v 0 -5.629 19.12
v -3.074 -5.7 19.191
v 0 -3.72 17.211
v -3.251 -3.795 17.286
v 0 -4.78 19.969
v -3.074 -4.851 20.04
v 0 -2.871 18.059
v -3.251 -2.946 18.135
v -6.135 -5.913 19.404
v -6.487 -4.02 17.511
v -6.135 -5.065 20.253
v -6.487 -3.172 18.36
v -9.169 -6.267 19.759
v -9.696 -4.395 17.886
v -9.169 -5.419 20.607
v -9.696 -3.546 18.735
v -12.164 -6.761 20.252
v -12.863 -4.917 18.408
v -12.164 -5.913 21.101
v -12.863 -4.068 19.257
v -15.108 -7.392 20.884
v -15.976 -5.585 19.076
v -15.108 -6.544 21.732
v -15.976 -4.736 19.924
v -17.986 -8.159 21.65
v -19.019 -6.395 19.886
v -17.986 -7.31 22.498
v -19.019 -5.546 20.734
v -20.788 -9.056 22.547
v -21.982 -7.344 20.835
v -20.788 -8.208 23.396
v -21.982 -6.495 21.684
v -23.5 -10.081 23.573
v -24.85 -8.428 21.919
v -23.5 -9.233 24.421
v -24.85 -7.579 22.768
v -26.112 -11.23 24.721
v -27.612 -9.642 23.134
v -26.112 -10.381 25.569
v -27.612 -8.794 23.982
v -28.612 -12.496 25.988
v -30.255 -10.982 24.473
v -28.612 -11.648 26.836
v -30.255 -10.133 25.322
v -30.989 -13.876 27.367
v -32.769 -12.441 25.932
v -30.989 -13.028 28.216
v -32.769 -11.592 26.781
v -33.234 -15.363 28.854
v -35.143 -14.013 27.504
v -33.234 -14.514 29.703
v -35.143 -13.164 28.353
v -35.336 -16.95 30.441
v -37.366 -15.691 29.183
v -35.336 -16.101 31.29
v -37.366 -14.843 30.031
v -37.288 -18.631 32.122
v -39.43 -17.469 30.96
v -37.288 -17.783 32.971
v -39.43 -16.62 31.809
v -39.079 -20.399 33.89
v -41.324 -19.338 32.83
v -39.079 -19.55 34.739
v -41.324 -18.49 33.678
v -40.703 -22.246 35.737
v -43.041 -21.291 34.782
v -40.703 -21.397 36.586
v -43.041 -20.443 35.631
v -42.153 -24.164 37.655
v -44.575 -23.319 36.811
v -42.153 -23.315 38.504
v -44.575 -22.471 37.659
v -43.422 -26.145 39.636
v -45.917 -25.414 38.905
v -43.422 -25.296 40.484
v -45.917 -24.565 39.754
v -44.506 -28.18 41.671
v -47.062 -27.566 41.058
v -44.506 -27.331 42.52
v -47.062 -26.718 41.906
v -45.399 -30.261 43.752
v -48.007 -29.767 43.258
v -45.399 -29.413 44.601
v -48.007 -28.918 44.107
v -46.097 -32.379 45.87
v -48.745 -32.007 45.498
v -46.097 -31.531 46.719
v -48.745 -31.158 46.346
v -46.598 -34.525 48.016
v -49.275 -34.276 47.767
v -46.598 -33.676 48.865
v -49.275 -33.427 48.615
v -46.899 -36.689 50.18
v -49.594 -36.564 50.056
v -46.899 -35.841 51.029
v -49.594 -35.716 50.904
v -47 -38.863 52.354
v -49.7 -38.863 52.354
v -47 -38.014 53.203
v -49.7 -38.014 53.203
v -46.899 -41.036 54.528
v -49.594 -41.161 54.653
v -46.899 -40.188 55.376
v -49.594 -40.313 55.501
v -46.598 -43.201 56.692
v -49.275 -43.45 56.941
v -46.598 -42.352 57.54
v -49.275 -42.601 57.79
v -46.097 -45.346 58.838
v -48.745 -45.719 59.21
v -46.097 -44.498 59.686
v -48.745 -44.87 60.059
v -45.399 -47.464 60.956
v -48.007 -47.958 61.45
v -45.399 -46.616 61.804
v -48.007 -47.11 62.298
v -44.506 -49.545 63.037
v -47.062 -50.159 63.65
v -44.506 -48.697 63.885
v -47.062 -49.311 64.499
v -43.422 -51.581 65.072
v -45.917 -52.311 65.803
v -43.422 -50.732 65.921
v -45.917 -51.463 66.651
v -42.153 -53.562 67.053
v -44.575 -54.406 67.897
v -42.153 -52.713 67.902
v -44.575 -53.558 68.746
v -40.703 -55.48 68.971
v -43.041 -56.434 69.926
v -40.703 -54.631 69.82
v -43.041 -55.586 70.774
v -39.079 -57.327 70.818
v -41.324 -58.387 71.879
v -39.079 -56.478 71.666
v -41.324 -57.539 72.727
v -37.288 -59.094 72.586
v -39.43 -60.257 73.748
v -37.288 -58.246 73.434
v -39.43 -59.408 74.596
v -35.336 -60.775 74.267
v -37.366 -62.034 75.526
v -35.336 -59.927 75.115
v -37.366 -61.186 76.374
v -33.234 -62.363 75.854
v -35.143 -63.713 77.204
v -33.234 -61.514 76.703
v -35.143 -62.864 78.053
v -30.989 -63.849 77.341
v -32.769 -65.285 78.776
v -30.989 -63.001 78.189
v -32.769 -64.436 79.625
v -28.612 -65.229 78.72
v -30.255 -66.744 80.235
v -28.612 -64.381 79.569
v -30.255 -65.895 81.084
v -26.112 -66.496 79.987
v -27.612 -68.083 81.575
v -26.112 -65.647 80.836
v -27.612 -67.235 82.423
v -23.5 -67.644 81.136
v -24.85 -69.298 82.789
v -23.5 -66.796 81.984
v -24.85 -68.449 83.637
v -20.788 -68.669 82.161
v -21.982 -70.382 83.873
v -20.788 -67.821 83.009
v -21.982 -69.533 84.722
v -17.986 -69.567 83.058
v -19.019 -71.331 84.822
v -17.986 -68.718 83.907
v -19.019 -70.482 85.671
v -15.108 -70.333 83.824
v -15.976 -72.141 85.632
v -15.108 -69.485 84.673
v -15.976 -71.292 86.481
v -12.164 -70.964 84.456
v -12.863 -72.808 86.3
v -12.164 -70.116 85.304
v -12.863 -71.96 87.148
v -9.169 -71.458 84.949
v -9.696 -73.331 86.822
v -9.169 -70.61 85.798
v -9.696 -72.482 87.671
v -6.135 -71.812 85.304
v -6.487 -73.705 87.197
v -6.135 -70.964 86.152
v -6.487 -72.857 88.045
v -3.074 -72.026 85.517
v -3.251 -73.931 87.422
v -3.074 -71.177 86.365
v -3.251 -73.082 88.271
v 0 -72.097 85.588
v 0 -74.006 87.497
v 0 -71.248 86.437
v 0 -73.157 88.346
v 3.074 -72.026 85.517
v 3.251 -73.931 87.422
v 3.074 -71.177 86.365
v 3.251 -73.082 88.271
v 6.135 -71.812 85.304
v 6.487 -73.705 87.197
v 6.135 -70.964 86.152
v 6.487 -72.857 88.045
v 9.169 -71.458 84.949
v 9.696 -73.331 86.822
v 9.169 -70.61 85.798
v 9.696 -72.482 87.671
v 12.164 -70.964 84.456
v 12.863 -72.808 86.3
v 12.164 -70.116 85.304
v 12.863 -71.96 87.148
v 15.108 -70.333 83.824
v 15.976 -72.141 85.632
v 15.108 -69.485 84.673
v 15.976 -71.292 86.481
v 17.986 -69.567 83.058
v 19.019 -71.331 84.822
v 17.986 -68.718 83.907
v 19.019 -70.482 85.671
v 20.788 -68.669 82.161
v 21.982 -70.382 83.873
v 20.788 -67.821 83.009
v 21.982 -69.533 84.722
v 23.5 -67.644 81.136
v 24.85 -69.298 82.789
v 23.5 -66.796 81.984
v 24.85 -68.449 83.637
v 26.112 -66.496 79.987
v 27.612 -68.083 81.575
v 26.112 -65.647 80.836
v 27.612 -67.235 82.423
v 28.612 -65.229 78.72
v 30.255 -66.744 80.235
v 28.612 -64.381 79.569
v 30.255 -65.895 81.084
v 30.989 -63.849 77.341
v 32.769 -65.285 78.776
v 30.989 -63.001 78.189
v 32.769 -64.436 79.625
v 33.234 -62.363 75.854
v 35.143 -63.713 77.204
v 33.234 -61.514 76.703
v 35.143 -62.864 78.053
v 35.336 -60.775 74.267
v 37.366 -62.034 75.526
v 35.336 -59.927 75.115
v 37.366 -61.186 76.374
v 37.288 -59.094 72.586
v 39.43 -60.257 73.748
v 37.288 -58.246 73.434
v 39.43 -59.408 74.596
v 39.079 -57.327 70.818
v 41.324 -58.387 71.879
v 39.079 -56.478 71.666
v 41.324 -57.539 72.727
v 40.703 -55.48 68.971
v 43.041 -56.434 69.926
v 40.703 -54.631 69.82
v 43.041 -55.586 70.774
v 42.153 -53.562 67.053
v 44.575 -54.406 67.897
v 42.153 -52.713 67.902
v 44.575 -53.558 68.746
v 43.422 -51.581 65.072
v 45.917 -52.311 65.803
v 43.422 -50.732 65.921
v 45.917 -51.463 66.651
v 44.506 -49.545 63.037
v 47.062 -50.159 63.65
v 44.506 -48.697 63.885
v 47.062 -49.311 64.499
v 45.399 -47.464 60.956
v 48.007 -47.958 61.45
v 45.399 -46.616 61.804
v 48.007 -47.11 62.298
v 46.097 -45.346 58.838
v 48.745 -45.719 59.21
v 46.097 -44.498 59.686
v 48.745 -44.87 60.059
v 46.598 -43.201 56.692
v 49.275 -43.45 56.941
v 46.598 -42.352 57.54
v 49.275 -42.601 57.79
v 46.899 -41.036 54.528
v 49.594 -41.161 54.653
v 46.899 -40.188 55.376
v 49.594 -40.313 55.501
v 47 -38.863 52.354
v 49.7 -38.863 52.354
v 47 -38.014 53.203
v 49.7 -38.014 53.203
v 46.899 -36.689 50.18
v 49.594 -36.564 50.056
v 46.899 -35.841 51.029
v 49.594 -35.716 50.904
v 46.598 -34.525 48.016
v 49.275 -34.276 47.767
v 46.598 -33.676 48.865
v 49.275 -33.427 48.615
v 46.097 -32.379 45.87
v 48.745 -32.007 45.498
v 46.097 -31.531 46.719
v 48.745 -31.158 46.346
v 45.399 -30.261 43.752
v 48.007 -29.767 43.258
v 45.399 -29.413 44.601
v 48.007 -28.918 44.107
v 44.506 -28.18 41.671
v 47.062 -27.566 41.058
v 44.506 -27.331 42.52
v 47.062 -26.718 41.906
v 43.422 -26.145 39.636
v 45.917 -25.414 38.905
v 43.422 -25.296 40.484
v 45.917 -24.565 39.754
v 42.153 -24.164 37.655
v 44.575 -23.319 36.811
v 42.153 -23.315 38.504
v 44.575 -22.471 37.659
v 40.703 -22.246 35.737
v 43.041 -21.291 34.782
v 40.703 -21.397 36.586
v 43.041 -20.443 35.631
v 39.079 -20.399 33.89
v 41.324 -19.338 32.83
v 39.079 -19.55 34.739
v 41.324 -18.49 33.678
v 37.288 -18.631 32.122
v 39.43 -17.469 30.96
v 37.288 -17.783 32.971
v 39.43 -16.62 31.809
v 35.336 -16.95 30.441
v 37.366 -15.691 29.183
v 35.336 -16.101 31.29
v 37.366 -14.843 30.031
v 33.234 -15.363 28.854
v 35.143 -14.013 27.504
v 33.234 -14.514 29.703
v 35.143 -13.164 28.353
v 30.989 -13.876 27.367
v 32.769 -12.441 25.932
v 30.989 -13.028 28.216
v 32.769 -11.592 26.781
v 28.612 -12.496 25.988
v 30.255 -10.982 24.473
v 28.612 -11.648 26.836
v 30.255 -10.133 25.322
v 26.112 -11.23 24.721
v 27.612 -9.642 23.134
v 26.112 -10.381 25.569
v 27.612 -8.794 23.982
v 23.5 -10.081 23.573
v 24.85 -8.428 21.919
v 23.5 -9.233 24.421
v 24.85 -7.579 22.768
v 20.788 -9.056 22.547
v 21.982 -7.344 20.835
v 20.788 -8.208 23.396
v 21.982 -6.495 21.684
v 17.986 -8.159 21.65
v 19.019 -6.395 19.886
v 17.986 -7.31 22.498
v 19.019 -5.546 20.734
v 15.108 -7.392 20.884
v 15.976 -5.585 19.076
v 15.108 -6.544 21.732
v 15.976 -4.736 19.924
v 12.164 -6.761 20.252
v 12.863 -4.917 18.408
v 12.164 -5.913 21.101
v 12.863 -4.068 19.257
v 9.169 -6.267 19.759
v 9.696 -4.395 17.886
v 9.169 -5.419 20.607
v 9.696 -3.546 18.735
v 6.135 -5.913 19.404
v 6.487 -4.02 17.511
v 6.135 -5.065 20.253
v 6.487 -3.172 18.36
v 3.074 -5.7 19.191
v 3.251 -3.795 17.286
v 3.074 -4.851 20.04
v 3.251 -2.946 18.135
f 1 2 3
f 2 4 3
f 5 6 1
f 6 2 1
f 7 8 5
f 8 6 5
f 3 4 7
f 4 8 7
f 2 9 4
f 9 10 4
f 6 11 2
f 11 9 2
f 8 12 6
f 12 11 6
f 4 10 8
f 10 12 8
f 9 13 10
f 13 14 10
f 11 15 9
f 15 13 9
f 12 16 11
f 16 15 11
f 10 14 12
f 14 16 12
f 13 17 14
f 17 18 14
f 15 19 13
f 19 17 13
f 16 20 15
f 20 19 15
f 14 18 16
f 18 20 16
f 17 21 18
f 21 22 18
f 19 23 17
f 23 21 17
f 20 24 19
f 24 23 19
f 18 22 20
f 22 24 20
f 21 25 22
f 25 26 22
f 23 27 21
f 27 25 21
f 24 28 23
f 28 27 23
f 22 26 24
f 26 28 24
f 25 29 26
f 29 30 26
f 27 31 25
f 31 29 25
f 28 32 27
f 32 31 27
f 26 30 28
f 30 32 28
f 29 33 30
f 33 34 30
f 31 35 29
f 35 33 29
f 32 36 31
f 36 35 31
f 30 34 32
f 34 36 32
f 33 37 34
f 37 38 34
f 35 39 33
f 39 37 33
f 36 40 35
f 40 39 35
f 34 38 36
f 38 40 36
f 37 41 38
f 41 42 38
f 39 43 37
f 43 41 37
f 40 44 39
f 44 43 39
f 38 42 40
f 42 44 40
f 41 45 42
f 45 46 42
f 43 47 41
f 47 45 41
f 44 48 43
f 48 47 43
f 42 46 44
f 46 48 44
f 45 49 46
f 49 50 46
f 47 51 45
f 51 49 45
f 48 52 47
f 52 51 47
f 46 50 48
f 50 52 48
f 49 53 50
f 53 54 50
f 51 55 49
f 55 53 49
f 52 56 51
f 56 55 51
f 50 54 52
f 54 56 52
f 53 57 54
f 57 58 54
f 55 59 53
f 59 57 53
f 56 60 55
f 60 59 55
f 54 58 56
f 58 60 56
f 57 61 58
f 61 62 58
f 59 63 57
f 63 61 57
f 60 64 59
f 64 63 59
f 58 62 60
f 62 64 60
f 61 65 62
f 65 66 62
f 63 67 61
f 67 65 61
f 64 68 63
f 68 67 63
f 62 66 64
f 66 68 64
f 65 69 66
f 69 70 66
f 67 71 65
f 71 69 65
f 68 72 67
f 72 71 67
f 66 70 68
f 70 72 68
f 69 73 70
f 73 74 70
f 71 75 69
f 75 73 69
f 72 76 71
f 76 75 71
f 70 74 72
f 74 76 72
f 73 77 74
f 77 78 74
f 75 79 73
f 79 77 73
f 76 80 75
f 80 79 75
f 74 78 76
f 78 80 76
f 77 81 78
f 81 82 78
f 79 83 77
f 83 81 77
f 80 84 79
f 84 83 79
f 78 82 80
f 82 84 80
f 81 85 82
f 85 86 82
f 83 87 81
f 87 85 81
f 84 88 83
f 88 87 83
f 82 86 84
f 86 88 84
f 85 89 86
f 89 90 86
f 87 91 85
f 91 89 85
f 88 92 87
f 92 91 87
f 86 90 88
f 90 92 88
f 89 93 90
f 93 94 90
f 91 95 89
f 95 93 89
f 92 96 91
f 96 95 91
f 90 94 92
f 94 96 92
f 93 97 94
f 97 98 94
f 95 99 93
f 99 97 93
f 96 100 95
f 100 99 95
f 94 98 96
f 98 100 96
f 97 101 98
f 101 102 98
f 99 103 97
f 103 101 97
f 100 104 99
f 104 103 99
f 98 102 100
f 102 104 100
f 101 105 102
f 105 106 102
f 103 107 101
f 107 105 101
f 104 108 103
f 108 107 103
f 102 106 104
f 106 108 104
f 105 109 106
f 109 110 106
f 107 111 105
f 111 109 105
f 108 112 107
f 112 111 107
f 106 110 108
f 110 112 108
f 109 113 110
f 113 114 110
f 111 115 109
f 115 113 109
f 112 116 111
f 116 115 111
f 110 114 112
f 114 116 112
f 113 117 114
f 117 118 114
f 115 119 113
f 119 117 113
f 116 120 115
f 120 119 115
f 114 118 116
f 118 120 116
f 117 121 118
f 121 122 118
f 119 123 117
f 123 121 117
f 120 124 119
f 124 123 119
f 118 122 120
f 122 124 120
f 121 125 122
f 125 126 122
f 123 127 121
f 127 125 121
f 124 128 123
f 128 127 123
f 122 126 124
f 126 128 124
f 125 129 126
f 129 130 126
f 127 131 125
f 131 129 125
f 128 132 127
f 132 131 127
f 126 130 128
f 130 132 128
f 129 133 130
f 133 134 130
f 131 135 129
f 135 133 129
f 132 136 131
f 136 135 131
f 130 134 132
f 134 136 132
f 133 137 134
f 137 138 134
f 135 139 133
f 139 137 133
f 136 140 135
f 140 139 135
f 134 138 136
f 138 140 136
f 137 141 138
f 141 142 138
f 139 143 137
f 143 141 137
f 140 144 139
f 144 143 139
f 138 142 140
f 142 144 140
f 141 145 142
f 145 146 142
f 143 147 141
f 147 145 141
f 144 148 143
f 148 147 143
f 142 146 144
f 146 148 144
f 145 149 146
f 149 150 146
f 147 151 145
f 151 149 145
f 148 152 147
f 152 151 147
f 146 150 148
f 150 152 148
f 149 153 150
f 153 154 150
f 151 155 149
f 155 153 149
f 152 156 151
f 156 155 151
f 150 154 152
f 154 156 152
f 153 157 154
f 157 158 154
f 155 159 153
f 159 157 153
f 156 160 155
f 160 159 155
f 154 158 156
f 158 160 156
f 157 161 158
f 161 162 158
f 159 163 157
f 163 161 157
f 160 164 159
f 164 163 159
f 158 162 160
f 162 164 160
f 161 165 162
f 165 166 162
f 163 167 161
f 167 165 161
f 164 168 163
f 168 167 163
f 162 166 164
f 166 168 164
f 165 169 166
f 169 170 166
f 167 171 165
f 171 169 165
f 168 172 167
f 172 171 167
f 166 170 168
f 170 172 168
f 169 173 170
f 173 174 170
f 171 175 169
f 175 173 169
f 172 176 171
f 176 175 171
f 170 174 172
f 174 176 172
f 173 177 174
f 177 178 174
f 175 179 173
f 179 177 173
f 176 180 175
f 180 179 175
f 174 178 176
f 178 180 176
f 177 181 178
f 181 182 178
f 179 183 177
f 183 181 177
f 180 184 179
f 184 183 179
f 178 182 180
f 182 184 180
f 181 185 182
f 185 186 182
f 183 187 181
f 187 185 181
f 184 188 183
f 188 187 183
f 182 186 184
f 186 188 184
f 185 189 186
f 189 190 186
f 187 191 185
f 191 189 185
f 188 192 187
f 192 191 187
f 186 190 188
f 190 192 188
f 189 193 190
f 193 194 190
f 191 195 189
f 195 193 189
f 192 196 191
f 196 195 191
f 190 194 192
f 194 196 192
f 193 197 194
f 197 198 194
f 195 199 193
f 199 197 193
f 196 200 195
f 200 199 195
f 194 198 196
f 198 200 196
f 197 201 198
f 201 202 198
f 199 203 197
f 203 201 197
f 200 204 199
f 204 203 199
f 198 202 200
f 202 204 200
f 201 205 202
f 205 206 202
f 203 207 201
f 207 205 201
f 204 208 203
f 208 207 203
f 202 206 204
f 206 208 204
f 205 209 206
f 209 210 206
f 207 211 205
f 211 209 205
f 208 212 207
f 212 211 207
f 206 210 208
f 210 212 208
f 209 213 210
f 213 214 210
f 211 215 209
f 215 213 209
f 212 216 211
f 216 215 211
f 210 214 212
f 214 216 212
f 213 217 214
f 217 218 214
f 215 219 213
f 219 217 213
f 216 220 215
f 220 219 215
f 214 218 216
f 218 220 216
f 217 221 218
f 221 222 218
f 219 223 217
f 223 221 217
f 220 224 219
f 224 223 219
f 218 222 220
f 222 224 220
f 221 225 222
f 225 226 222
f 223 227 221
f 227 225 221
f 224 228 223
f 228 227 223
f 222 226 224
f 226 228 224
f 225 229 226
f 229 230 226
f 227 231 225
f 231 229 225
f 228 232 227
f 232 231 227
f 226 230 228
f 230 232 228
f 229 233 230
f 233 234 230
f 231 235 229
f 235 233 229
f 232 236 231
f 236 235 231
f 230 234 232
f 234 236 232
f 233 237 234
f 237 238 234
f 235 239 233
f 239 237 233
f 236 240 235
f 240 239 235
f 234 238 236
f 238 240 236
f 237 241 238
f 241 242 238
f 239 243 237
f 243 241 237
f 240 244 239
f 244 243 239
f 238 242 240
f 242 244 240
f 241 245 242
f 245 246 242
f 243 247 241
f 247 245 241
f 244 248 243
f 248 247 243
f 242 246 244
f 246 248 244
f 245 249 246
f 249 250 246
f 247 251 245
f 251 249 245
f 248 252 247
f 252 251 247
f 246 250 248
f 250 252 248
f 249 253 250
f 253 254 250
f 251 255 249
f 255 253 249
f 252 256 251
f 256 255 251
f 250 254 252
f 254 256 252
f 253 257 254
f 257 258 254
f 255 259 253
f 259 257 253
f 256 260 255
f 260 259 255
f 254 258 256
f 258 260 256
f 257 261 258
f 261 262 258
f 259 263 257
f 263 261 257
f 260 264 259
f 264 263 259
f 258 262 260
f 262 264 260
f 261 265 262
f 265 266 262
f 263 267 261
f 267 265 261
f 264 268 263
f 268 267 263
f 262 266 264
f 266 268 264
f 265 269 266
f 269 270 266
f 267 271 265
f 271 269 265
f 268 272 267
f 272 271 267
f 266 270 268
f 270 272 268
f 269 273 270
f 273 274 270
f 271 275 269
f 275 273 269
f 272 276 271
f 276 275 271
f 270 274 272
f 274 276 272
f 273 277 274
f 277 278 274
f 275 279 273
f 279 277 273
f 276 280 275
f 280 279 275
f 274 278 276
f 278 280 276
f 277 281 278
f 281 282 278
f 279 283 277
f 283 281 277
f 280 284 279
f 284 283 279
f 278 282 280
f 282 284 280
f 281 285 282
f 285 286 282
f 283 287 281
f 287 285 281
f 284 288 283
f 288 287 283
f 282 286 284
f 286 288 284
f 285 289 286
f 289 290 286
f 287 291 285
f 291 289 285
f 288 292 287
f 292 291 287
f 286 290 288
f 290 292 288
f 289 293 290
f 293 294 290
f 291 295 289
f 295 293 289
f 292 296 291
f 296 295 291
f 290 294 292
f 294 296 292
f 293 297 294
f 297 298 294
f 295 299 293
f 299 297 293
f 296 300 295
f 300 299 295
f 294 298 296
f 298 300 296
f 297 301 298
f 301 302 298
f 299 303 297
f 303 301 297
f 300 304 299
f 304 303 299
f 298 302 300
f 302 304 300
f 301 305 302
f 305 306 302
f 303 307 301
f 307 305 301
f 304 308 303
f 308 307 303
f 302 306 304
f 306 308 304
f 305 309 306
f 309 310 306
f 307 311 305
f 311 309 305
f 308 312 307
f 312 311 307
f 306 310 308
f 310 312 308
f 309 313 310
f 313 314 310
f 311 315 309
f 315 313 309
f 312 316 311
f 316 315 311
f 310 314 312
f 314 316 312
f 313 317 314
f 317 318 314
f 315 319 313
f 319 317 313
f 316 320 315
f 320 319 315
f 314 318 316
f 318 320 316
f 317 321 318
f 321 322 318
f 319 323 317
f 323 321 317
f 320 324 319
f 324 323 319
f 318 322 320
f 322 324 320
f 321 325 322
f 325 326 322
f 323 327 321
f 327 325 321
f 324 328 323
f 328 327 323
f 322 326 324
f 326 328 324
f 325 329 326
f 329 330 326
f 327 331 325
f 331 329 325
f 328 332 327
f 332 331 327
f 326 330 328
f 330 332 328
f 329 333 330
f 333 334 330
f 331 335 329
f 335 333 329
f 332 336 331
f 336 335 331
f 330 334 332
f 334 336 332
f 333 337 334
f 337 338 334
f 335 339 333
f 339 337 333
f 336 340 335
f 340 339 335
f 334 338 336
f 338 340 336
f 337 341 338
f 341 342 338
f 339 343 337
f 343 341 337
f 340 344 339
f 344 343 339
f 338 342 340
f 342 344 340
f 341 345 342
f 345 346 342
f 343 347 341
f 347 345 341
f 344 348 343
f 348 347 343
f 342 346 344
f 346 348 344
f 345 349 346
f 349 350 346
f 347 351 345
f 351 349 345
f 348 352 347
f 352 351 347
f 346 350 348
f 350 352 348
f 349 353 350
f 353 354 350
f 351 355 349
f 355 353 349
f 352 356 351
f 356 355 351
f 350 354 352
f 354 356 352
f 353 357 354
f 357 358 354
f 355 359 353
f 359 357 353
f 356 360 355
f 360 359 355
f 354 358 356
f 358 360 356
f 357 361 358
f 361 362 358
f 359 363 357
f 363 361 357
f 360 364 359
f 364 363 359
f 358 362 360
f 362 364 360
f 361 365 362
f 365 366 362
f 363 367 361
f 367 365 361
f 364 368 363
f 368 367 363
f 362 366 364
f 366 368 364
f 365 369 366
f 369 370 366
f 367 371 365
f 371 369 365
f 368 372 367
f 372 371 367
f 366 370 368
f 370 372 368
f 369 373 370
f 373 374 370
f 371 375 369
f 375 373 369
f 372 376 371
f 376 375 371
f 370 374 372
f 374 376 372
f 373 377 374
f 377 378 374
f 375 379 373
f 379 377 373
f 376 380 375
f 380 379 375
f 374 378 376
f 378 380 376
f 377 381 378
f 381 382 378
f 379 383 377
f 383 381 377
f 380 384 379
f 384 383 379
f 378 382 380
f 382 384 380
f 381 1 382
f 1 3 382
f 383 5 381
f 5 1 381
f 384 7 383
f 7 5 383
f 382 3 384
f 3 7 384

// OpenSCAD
include <../lib/servo-duct-manifold-lib.scad>;
$fn = 96;
cubic_cell_2_gasket();
